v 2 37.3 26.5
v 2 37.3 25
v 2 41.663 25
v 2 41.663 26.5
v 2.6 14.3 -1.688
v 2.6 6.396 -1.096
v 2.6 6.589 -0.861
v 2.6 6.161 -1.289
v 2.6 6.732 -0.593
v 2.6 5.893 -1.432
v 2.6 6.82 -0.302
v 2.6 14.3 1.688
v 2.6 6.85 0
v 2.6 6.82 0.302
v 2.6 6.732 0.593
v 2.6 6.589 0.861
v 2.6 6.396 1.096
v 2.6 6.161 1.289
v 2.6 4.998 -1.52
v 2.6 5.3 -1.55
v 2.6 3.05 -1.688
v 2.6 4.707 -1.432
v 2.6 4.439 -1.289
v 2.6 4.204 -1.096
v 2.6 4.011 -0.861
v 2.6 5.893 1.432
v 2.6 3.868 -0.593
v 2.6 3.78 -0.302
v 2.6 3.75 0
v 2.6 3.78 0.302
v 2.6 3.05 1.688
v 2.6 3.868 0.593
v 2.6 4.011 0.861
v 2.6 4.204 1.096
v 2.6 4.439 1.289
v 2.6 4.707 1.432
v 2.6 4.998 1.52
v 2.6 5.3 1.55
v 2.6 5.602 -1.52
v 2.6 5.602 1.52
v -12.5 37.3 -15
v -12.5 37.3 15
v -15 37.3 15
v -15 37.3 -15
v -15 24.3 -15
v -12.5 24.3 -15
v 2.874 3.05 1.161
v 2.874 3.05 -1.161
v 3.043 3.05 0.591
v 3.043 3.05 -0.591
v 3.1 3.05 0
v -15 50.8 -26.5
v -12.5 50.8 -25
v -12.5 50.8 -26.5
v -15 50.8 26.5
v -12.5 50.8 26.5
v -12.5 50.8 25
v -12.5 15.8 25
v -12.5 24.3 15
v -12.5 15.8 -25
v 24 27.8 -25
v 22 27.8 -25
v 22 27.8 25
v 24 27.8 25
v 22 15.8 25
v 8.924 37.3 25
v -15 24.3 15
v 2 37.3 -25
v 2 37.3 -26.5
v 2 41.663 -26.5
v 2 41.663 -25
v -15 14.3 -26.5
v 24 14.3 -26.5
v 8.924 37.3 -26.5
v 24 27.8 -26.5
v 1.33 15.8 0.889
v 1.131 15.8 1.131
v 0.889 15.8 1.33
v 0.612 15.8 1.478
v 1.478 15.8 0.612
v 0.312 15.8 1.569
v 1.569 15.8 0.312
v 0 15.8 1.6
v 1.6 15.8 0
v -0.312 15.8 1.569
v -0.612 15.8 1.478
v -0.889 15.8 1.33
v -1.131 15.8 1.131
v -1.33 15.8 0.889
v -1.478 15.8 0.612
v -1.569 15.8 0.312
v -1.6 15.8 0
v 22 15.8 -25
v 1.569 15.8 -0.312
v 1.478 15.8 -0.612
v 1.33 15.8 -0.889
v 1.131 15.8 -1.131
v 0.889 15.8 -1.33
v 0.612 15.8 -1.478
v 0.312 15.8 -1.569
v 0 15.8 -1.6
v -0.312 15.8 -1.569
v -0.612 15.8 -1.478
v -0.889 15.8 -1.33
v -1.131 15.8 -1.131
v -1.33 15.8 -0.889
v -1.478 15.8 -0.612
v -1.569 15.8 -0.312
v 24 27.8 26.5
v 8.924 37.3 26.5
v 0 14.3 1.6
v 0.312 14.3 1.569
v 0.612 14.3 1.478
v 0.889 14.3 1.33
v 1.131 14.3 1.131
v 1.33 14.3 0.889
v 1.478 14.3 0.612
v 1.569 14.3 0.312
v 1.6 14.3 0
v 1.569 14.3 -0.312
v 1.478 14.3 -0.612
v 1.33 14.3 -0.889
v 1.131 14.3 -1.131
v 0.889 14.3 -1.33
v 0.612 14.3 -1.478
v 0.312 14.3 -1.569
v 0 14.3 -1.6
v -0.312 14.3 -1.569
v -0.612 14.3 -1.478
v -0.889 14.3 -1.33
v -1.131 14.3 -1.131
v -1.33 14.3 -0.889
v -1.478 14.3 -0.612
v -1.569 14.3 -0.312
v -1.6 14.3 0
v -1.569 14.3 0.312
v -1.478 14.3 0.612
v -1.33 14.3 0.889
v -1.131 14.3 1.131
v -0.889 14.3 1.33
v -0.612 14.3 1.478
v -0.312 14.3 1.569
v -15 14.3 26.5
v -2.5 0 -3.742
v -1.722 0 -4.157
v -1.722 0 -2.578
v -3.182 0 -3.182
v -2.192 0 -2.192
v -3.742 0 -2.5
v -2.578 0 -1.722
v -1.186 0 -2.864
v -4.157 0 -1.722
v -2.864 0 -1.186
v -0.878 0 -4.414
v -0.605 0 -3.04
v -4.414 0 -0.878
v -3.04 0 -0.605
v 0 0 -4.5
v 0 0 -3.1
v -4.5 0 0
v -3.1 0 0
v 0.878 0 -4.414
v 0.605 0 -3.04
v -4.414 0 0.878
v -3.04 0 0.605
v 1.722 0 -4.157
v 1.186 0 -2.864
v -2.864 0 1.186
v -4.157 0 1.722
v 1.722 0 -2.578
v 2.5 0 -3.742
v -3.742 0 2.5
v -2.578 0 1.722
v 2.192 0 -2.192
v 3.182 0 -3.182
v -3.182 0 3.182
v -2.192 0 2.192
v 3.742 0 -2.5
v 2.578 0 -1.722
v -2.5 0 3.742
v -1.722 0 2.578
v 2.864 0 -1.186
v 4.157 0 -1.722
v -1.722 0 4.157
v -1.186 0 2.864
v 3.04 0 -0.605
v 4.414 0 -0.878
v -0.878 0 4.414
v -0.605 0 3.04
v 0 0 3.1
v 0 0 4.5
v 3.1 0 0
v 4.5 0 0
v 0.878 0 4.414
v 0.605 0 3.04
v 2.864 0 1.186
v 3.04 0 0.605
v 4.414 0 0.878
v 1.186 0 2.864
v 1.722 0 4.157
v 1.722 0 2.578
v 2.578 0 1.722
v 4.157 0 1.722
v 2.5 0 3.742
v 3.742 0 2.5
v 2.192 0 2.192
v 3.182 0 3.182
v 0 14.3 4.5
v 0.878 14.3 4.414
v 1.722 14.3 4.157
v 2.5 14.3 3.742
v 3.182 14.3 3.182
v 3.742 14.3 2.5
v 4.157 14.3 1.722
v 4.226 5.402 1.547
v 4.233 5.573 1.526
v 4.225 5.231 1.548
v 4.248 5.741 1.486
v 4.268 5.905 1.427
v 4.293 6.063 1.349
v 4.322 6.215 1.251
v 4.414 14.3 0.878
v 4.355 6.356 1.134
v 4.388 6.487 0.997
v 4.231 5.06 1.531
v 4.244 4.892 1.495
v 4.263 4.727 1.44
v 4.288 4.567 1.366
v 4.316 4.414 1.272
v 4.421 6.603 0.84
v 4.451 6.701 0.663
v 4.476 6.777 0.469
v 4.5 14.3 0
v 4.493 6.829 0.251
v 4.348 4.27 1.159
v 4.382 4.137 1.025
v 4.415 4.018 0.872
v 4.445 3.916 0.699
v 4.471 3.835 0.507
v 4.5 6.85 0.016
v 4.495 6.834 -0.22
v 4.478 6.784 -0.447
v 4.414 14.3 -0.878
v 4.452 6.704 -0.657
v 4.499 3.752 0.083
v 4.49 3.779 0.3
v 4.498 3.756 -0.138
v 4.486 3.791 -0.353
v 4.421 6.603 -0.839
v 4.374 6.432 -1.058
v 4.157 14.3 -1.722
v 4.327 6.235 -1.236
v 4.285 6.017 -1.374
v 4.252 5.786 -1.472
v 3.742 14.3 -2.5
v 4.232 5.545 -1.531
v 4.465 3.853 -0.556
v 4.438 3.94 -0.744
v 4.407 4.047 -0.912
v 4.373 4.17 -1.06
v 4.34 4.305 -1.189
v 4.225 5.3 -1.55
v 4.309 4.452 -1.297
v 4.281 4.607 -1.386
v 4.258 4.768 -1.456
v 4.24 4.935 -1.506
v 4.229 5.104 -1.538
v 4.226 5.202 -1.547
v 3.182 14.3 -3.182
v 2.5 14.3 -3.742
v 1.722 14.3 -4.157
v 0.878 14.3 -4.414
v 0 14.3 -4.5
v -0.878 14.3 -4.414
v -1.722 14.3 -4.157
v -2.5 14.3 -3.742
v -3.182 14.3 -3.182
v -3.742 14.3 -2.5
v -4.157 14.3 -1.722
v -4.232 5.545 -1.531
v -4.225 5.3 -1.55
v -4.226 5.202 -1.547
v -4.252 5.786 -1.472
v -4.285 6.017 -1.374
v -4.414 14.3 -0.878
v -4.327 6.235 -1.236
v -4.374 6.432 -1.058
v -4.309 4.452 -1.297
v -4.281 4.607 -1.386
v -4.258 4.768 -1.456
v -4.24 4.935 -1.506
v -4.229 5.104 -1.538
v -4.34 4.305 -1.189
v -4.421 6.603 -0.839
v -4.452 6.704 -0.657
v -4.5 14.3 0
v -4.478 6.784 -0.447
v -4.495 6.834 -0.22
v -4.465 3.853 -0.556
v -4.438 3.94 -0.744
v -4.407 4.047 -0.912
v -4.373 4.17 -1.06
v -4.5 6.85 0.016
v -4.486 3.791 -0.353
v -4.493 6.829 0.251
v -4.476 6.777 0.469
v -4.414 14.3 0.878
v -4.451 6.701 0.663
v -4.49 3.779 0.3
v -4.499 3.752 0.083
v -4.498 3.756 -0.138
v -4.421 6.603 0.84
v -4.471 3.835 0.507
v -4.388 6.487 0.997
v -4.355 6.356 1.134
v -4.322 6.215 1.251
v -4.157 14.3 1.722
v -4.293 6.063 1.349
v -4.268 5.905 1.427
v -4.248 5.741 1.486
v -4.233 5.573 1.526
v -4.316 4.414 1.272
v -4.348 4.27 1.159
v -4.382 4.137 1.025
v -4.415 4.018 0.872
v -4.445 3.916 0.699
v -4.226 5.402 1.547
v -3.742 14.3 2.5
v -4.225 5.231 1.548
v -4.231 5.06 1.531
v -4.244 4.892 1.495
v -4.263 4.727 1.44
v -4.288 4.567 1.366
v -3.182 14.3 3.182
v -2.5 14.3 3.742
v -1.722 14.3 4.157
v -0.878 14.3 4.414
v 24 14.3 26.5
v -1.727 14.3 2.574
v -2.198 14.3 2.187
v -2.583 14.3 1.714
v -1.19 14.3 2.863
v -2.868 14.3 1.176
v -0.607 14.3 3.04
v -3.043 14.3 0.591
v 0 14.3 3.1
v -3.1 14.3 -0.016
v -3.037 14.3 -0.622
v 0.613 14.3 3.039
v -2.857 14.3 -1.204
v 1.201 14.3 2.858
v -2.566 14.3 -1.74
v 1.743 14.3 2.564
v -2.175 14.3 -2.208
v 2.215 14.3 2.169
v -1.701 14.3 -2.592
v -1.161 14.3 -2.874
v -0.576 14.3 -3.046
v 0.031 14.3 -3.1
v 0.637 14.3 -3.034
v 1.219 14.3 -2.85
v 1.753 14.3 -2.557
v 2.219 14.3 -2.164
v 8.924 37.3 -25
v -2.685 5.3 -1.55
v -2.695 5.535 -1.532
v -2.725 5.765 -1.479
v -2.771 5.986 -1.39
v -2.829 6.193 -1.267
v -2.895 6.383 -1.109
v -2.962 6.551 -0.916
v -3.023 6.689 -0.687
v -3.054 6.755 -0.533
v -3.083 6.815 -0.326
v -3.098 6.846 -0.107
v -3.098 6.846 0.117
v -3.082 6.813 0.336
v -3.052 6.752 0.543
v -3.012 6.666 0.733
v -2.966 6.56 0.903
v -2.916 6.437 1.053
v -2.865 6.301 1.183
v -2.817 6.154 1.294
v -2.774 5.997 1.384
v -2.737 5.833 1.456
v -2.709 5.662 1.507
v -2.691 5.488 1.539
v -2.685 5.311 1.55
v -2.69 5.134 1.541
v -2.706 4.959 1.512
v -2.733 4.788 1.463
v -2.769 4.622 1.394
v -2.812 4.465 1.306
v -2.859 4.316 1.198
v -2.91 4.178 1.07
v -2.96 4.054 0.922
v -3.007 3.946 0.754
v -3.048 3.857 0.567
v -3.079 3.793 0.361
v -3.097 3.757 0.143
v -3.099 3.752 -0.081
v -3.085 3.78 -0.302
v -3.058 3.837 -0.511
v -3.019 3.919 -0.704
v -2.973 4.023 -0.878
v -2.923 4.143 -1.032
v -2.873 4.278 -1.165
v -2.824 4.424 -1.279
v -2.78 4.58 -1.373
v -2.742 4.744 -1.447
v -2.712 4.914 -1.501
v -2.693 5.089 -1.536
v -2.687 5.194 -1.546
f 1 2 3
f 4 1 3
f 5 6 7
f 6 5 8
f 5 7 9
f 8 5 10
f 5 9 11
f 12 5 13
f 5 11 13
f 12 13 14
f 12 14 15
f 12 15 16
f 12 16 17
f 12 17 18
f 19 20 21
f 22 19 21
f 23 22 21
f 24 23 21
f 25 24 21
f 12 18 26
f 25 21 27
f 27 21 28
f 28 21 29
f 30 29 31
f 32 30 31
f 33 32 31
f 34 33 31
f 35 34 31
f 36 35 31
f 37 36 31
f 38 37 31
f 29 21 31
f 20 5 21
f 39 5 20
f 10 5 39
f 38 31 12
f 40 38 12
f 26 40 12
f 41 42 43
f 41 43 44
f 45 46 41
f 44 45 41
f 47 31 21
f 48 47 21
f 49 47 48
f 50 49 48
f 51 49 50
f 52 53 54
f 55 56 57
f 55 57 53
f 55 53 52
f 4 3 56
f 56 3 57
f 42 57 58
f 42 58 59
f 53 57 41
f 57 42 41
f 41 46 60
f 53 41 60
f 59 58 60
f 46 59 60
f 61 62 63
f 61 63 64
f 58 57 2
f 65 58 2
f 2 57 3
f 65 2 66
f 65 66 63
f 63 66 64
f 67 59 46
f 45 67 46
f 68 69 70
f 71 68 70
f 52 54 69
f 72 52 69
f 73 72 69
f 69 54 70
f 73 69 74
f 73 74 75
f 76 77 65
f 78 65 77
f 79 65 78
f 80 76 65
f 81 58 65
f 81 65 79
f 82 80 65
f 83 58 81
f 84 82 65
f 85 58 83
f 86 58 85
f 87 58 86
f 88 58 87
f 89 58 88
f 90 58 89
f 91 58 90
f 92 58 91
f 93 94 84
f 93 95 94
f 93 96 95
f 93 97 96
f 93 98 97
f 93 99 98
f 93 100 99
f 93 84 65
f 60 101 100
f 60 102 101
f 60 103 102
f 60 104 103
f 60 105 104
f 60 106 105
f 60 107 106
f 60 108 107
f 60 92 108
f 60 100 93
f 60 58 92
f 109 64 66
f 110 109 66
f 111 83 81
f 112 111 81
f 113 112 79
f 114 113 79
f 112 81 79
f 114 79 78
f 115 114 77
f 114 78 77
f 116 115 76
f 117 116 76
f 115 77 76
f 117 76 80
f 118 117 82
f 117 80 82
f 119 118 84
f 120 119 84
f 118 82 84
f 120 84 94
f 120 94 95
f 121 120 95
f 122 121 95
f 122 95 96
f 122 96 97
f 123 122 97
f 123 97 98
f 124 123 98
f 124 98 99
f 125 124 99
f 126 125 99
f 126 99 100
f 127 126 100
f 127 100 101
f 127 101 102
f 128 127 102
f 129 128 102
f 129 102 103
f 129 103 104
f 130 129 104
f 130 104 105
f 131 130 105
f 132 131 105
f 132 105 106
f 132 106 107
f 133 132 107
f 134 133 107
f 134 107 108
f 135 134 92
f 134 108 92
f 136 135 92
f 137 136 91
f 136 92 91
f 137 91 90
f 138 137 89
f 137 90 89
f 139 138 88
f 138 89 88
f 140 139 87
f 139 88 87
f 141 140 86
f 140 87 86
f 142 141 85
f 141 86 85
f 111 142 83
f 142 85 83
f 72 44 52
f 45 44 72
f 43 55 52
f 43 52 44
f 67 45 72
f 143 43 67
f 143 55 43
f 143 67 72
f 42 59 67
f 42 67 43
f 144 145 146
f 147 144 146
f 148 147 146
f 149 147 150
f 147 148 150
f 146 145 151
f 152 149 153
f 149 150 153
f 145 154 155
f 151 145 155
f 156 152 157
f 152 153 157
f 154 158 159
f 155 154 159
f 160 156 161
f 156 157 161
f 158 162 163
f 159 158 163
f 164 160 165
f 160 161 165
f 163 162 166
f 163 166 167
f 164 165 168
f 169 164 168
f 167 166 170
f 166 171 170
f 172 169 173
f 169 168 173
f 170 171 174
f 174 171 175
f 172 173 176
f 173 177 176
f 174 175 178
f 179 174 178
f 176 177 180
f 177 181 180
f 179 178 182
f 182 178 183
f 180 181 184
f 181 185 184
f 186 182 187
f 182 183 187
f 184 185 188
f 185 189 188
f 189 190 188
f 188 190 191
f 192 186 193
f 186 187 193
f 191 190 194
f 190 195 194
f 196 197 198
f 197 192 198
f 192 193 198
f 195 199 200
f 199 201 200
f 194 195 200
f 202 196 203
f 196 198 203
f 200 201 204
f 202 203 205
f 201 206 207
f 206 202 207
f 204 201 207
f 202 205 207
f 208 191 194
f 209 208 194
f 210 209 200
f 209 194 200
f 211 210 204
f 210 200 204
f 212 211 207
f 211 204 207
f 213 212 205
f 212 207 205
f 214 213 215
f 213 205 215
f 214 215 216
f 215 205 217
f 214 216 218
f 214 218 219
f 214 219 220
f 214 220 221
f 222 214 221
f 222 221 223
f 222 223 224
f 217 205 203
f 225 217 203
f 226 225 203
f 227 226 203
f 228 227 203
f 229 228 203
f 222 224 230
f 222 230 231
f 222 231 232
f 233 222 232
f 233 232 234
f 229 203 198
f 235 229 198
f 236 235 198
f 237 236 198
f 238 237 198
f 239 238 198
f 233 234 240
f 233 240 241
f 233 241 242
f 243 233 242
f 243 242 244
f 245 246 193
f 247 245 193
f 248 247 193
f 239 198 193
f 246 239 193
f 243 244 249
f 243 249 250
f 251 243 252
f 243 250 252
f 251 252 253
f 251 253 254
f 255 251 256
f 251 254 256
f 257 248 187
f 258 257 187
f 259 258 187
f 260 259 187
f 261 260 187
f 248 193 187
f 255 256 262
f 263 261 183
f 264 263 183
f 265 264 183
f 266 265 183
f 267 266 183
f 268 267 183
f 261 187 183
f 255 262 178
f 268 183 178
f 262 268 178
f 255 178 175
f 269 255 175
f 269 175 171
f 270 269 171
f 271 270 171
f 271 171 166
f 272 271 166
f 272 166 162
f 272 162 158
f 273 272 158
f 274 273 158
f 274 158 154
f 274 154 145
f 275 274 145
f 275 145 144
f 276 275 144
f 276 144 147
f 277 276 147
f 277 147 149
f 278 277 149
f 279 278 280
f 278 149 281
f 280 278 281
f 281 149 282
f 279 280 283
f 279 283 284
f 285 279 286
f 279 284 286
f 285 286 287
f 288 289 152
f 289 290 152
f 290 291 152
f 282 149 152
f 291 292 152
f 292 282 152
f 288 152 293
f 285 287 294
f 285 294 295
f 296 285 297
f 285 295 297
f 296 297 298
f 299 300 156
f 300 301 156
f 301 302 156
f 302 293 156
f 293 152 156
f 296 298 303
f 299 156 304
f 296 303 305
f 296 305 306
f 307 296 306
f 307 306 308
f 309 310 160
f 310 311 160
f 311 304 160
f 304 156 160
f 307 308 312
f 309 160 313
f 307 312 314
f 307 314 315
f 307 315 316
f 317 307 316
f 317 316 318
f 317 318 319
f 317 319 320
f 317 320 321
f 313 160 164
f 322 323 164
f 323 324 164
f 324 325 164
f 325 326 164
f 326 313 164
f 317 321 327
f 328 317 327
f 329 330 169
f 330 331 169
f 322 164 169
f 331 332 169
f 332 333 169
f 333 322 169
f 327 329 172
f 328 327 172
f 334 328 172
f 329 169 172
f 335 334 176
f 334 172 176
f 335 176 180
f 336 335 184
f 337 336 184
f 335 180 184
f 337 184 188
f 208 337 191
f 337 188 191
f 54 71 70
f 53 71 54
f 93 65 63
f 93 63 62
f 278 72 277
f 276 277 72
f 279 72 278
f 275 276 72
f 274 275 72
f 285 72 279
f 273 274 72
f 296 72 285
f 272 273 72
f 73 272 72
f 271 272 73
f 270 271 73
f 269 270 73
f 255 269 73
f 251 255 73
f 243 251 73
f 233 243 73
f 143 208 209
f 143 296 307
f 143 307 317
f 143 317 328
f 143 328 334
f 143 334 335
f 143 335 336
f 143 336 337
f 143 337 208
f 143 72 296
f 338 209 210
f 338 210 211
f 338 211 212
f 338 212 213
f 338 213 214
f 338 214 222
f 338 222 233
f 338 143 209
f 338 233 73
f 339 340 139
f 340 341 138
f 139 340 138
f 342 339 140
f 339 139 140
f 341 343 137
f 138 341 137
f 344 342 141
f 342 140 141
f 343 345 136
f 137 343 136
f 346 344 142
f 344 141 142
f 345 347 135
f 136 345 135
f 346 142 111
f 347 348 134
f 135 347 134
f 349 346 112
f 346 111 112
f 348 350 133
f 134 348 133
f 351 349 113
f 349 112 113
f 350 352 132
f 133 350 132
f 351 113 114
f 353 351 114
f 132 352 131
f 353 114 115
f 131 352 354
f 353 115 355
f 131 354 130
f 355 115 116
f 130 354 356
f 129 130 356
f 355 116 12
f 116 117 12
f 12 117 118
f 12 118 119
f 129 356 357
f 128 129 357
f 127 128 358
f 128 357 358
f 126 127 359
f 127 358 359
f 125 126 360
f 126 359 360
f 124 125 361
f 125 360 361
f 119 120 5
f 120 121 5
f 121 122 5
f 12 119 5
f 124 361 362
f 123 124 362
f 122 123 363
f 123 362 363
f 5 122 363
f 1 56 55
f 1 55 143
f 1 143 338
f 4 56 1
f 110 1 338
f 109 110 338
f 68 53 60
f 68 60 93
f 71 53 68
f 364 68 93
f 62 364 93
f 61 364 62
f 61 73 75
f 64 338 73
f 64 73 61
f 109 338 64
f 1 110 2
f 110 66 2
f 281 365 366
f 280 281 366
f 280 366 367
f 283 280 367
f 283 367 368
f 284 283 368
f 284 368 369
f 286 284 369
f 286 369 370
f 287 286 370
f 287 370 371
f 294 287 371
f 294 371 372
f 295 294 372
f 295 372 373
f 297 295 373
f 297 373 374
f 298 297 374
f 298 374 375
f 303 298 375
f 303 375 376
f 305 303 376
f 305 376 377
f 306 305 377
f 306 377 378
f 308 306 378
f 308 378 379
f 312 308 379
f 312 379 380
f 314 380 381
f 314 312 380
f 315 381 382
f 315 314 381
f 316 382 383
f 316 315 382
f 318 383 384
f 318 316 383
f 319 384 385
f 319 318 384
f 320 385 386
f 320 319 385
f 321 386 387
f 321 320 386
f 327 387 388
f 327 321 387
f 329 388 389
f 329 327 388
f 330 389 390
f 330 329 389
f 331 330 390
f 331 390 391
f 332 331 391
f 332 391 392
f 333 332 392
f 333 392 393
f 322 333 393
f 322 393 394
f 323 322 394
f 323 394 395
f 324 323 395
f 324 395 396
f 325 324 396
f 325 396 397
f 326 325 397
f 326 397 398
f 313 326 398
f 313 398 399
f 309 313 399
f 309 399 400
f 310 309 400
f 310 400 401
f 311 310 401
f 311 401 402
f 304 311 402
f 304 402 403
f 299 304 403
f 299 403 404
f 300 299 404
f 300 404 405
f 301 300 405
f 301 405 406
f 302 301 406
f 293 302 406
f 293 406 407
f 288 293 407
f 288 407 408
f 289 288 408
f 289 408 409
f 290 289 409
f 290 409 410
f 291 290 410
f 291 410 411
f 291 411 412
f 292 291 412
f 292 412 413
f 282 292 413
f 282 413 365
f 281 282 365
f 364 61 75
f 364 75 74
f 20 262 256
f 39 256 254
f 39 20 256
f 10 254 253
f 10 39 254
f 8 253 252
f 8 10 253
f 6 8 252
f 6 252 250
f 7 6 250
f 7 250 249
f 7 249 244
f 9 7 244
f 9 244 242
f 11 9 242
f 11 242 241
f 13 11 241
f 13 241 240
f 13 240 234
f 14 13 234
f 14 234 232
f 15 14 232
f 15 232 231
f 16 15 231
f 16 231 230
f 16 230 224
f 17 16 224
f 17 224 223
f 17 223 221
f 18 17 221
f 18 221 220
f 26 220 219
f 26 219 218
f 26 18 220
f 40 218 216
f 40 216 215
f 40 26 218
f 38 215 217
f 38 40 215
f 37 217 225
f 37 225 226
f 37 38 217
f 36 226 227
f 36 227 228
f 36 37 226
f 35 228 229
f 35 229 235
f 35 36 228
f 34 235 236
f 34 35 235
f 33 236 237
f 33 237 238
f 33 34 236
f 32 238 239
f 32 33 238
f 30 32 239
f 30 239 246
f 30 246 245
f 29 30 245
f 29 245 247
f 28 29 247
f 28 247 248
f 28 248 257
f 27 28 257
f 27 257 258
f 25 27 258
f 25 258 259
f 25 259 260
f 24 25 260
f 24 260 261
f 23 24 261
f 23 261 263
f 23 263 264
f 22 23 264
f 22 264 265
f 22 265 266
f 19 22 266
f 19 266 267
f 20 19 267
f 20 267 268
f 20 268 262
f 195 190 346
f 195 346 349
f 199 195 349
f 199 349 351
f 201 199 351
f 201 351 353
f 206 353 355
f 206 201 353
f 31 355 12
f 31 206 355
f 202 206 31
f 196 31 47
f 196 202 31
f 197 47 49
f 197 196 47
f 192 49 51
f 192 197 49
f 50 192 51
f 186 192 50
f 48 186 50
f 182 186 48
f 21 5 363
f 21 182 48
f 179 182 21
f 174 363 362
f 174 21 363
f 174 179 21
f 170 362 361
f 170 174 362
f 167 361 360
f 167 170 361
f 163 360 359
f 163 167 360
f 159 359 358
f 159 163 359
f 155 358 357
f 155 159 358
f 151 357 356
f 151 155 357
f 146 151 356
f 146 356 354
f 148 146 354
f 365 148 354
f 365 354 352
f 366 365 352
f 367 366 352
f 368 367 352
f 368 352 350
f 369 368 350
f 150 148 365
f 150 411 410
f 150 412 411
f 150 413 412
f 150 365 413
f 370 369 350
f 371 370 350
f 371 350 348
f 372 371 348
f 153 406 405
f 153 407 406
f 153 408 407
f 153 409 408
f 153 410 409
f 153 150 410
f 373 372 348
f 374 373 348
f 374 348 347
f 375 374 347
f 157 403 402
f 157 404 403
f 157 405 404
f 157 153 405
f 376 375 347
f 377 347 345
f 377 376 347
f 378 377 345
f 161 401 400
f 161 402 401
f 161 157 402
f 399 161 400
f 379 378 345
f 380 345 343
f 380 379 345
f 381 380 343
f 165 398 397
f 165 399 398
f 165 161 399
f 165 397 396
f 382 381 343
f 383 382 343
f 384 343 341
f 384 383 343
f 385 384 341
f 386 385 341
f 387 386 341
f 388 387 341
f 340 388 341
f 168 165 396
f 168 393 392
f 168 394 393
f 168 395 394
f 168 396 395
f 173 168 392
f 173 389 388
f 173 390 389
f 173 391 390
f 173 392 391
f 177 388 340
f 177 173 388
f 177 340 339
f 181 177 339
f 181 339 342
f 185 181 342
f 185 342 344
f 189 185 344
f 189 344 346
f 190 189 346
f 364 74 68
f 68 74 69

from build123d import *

# Parameters (mm, degrees)
SKETCH_1_R               = 4.5
SKETCH_1_R_2             = 3.1
EXTRUDE_1_DEPTH          = 14.3
EXTRUDE_START            = -11.25
EXTRUDE_2_DEPTH          = 11.25
SKETCH_4_W               = 30
SKETCH_4_H               = 50
EXTRUDE_3_DEPTH          = 1.5
SKETCH_5_R               = 1.6
CUT_EXTRUDE_2_DEPTH      = 34.160820255
SKETCH_6_W               = 2.5
SKETCH_6_H               = 50
EXTRUDE_4_DEPTH          = 35
SKETCH_7_W               = 30
SKETCH_7_H               = 13
CUT_EXTRUDE_3_DEPTH      = 10
CUT_EXTRUDE_4_DEPTH      = 59.571665505
CUT_EXTRUDE_4_DEPTH_BACK = 59.571665505
SKETCH_9_R               = 1.55
SKETCH_10_W              = 50
SKETCH_10_H              = 1.5
EXTRUDE_6_DEPTH          = 9
SKETCH_12_W              = 2
SKETCH_12_H              = 50
EXTRUDE_7_DEPTH          = 12
EXTRUDE_8_DEPTH          = 1.5
SKETCH_14_W              = 22
SKETCH_14_H              = 13.5
CUT_EXTRUDE_5_DEPTH      = 78.237555632


with BuildPart() as part:
    # 草图1 → 凸台-拉伸1 (new body)
    with BuildSketch(Plane(origin=(0, 0, 0), x_dir=(1, 0, 0), z_dir=(0, 1, 0))):
        with Locations(Location((0, 0, 0), (0, 0, 270))):
            Circle(SKETCH_1_R)
        with Locations(Location((0, 0, 0), (0, 0, 270))):
            Circle(SKETCH_1_R_2, mode=Mode.SUBTRACT)
    extrude(amount=EXTRUDE_1_DEPTH)

    # 草图2 → 凸台-拉伸2 (add)
    with BuildSketch(Plane(origin=(0, 14.3, 0), x_dir=(1, 0, 0), z_dir=(0, 1, 0)).offset(EXTRUDE_START)):
        with BuildLine():
            Line((2.6, 1.688194302), (2.6, -1.688194302))
            ThreePointArc((2.6, -1.688194302), (3.1, 0), (2.6, 1.688194302))
        make_face()
    extrude(amount=EXTRUDE_2_DEPTH)

    # 草图4 → 凸台-拉伸3 (add)
    with BuildSketch(Plane(origin=(0, 14.3, 0), x_dir=(1, 0, 0), z_dir=(0, 1, 0))):
        Rectangle(SKETCH_4_W, SKETCH_4_H)
    extrude(amount=EXTRUDE_3_DEPTH)

    # 草图5 → 切除-拉伸2 (cut, through all)
    with BuildSketch(Plane(origin=(0, 15.8, 0), x_dir=(1, 0, 0), z_dir=(0, 1, 0))):
        with Locations(Location((0, 0, 0), (0, 0, 270))):
            Circle(SKETCH_5_R)
    extrude(amount=-CUT_EXTRUDE_2_DEPTH, mode=Mode.SUBTRACT)

    # 草图6 → 凸台-拉伸4 (add)
    with BuildSketch(Plane(origin=(0, 15.8, 0), x_dir=(1, 0, 0), z_dir=(0, 1, 0))):
        with Locations((-13.75, 0)):
            Rectangle(SKETCH_6_W, SKETCH_6_H)
    extrude(amount=EXTRUDE_4_DEPTH)

    # 草图7 → 切除-拉伸3 (cut)
    with BuildSketch(Plane(origin=(-12.5, 0, 0), x_dir=(0, 0, -1), z_dir=(1, 0, 0))):
        with Locations((0, 30.8)):
            Rectangle(SKETCH_7_W, SKETCH_7_H)
    extrude(amount=-CUT_EXTRUDE_3_DEPTH, mode=Mode.SUBTRACT)

    # 草图9 → 切除-拉伸4 (cut, two sides: drawn at the far end of the back side and taken through both)
    with BuildSketch(Plane(origin=(0, 0, 0), x_dir=(0, 0, -1), z_dir=(1, 0, 0)).offset(-CUT_EXTRUDE_4_DEPTH_BACK)):
        with Locations((0, 5.3)):
            Circle(SKETCH_9_R)
    extrude(amount=CUT_EXTRUDE_4_DEPTH + CUT_EXTRUDE_4_DEPTH_BACK, mode=Mode.SUBTRACT)

    # 草图10 → 凸台-拉伸6 (add)
    with BuildSketch(Plane(origin=(15, 0, 0), x_dir=(0, 0, -1), z_dir=(1, 0, 0))):
        with Locations((0, 15.05)):
            Rectangle(SKETCH_10_W, SKETCH_10_H)
    extrude(amount=EXTRUDE_6_DEPTH)

    # 草图12 → 凸台-拉伸7 (add)
    with BuildSketch(Plane(origin=(0, 15.8, 0), x_dir=(1, 0, 0), z_dir=(0, 1, 0))):
        with Locations((23, 0)):
            Rectangle(SKETCH_12_W, SKETCH_12_H)
    extrude(amount=EXTRUDE_7_DEPTH)

    # 草图13 → 凸台-拉伸8 (add)
    with BuildSketch(Plane.XY.offset(25)):
        Polygon((24, 27.8), (-12.5, 50.8), (-15, 50.8), (-15, 14.3), (24, 14.3), align=None)
    extrude_8 = extrude(amount=EXTRUDE_8_DEPTH)

    # 镜向2: 凸台-拉伸8 across plane
    add(extrude_8.mirror(Plane.XY))

    # 草图14 → 切除-拉伸5 (cut, through all)
    with BuildSketch(Plane(origin=(0, 0, -26.5), x_dir=(-1, 0, 0), z_dir=(0, 0, -1))):
        with Locations((-13, 44.05)):
            Rectangle(SKETCH_14_W, SKETCH_14_H)
    extrude(amount=-CUT_EXTRUDE_5_DEPTH, mode=Mode.SUBTRACT)


solid = part.part
